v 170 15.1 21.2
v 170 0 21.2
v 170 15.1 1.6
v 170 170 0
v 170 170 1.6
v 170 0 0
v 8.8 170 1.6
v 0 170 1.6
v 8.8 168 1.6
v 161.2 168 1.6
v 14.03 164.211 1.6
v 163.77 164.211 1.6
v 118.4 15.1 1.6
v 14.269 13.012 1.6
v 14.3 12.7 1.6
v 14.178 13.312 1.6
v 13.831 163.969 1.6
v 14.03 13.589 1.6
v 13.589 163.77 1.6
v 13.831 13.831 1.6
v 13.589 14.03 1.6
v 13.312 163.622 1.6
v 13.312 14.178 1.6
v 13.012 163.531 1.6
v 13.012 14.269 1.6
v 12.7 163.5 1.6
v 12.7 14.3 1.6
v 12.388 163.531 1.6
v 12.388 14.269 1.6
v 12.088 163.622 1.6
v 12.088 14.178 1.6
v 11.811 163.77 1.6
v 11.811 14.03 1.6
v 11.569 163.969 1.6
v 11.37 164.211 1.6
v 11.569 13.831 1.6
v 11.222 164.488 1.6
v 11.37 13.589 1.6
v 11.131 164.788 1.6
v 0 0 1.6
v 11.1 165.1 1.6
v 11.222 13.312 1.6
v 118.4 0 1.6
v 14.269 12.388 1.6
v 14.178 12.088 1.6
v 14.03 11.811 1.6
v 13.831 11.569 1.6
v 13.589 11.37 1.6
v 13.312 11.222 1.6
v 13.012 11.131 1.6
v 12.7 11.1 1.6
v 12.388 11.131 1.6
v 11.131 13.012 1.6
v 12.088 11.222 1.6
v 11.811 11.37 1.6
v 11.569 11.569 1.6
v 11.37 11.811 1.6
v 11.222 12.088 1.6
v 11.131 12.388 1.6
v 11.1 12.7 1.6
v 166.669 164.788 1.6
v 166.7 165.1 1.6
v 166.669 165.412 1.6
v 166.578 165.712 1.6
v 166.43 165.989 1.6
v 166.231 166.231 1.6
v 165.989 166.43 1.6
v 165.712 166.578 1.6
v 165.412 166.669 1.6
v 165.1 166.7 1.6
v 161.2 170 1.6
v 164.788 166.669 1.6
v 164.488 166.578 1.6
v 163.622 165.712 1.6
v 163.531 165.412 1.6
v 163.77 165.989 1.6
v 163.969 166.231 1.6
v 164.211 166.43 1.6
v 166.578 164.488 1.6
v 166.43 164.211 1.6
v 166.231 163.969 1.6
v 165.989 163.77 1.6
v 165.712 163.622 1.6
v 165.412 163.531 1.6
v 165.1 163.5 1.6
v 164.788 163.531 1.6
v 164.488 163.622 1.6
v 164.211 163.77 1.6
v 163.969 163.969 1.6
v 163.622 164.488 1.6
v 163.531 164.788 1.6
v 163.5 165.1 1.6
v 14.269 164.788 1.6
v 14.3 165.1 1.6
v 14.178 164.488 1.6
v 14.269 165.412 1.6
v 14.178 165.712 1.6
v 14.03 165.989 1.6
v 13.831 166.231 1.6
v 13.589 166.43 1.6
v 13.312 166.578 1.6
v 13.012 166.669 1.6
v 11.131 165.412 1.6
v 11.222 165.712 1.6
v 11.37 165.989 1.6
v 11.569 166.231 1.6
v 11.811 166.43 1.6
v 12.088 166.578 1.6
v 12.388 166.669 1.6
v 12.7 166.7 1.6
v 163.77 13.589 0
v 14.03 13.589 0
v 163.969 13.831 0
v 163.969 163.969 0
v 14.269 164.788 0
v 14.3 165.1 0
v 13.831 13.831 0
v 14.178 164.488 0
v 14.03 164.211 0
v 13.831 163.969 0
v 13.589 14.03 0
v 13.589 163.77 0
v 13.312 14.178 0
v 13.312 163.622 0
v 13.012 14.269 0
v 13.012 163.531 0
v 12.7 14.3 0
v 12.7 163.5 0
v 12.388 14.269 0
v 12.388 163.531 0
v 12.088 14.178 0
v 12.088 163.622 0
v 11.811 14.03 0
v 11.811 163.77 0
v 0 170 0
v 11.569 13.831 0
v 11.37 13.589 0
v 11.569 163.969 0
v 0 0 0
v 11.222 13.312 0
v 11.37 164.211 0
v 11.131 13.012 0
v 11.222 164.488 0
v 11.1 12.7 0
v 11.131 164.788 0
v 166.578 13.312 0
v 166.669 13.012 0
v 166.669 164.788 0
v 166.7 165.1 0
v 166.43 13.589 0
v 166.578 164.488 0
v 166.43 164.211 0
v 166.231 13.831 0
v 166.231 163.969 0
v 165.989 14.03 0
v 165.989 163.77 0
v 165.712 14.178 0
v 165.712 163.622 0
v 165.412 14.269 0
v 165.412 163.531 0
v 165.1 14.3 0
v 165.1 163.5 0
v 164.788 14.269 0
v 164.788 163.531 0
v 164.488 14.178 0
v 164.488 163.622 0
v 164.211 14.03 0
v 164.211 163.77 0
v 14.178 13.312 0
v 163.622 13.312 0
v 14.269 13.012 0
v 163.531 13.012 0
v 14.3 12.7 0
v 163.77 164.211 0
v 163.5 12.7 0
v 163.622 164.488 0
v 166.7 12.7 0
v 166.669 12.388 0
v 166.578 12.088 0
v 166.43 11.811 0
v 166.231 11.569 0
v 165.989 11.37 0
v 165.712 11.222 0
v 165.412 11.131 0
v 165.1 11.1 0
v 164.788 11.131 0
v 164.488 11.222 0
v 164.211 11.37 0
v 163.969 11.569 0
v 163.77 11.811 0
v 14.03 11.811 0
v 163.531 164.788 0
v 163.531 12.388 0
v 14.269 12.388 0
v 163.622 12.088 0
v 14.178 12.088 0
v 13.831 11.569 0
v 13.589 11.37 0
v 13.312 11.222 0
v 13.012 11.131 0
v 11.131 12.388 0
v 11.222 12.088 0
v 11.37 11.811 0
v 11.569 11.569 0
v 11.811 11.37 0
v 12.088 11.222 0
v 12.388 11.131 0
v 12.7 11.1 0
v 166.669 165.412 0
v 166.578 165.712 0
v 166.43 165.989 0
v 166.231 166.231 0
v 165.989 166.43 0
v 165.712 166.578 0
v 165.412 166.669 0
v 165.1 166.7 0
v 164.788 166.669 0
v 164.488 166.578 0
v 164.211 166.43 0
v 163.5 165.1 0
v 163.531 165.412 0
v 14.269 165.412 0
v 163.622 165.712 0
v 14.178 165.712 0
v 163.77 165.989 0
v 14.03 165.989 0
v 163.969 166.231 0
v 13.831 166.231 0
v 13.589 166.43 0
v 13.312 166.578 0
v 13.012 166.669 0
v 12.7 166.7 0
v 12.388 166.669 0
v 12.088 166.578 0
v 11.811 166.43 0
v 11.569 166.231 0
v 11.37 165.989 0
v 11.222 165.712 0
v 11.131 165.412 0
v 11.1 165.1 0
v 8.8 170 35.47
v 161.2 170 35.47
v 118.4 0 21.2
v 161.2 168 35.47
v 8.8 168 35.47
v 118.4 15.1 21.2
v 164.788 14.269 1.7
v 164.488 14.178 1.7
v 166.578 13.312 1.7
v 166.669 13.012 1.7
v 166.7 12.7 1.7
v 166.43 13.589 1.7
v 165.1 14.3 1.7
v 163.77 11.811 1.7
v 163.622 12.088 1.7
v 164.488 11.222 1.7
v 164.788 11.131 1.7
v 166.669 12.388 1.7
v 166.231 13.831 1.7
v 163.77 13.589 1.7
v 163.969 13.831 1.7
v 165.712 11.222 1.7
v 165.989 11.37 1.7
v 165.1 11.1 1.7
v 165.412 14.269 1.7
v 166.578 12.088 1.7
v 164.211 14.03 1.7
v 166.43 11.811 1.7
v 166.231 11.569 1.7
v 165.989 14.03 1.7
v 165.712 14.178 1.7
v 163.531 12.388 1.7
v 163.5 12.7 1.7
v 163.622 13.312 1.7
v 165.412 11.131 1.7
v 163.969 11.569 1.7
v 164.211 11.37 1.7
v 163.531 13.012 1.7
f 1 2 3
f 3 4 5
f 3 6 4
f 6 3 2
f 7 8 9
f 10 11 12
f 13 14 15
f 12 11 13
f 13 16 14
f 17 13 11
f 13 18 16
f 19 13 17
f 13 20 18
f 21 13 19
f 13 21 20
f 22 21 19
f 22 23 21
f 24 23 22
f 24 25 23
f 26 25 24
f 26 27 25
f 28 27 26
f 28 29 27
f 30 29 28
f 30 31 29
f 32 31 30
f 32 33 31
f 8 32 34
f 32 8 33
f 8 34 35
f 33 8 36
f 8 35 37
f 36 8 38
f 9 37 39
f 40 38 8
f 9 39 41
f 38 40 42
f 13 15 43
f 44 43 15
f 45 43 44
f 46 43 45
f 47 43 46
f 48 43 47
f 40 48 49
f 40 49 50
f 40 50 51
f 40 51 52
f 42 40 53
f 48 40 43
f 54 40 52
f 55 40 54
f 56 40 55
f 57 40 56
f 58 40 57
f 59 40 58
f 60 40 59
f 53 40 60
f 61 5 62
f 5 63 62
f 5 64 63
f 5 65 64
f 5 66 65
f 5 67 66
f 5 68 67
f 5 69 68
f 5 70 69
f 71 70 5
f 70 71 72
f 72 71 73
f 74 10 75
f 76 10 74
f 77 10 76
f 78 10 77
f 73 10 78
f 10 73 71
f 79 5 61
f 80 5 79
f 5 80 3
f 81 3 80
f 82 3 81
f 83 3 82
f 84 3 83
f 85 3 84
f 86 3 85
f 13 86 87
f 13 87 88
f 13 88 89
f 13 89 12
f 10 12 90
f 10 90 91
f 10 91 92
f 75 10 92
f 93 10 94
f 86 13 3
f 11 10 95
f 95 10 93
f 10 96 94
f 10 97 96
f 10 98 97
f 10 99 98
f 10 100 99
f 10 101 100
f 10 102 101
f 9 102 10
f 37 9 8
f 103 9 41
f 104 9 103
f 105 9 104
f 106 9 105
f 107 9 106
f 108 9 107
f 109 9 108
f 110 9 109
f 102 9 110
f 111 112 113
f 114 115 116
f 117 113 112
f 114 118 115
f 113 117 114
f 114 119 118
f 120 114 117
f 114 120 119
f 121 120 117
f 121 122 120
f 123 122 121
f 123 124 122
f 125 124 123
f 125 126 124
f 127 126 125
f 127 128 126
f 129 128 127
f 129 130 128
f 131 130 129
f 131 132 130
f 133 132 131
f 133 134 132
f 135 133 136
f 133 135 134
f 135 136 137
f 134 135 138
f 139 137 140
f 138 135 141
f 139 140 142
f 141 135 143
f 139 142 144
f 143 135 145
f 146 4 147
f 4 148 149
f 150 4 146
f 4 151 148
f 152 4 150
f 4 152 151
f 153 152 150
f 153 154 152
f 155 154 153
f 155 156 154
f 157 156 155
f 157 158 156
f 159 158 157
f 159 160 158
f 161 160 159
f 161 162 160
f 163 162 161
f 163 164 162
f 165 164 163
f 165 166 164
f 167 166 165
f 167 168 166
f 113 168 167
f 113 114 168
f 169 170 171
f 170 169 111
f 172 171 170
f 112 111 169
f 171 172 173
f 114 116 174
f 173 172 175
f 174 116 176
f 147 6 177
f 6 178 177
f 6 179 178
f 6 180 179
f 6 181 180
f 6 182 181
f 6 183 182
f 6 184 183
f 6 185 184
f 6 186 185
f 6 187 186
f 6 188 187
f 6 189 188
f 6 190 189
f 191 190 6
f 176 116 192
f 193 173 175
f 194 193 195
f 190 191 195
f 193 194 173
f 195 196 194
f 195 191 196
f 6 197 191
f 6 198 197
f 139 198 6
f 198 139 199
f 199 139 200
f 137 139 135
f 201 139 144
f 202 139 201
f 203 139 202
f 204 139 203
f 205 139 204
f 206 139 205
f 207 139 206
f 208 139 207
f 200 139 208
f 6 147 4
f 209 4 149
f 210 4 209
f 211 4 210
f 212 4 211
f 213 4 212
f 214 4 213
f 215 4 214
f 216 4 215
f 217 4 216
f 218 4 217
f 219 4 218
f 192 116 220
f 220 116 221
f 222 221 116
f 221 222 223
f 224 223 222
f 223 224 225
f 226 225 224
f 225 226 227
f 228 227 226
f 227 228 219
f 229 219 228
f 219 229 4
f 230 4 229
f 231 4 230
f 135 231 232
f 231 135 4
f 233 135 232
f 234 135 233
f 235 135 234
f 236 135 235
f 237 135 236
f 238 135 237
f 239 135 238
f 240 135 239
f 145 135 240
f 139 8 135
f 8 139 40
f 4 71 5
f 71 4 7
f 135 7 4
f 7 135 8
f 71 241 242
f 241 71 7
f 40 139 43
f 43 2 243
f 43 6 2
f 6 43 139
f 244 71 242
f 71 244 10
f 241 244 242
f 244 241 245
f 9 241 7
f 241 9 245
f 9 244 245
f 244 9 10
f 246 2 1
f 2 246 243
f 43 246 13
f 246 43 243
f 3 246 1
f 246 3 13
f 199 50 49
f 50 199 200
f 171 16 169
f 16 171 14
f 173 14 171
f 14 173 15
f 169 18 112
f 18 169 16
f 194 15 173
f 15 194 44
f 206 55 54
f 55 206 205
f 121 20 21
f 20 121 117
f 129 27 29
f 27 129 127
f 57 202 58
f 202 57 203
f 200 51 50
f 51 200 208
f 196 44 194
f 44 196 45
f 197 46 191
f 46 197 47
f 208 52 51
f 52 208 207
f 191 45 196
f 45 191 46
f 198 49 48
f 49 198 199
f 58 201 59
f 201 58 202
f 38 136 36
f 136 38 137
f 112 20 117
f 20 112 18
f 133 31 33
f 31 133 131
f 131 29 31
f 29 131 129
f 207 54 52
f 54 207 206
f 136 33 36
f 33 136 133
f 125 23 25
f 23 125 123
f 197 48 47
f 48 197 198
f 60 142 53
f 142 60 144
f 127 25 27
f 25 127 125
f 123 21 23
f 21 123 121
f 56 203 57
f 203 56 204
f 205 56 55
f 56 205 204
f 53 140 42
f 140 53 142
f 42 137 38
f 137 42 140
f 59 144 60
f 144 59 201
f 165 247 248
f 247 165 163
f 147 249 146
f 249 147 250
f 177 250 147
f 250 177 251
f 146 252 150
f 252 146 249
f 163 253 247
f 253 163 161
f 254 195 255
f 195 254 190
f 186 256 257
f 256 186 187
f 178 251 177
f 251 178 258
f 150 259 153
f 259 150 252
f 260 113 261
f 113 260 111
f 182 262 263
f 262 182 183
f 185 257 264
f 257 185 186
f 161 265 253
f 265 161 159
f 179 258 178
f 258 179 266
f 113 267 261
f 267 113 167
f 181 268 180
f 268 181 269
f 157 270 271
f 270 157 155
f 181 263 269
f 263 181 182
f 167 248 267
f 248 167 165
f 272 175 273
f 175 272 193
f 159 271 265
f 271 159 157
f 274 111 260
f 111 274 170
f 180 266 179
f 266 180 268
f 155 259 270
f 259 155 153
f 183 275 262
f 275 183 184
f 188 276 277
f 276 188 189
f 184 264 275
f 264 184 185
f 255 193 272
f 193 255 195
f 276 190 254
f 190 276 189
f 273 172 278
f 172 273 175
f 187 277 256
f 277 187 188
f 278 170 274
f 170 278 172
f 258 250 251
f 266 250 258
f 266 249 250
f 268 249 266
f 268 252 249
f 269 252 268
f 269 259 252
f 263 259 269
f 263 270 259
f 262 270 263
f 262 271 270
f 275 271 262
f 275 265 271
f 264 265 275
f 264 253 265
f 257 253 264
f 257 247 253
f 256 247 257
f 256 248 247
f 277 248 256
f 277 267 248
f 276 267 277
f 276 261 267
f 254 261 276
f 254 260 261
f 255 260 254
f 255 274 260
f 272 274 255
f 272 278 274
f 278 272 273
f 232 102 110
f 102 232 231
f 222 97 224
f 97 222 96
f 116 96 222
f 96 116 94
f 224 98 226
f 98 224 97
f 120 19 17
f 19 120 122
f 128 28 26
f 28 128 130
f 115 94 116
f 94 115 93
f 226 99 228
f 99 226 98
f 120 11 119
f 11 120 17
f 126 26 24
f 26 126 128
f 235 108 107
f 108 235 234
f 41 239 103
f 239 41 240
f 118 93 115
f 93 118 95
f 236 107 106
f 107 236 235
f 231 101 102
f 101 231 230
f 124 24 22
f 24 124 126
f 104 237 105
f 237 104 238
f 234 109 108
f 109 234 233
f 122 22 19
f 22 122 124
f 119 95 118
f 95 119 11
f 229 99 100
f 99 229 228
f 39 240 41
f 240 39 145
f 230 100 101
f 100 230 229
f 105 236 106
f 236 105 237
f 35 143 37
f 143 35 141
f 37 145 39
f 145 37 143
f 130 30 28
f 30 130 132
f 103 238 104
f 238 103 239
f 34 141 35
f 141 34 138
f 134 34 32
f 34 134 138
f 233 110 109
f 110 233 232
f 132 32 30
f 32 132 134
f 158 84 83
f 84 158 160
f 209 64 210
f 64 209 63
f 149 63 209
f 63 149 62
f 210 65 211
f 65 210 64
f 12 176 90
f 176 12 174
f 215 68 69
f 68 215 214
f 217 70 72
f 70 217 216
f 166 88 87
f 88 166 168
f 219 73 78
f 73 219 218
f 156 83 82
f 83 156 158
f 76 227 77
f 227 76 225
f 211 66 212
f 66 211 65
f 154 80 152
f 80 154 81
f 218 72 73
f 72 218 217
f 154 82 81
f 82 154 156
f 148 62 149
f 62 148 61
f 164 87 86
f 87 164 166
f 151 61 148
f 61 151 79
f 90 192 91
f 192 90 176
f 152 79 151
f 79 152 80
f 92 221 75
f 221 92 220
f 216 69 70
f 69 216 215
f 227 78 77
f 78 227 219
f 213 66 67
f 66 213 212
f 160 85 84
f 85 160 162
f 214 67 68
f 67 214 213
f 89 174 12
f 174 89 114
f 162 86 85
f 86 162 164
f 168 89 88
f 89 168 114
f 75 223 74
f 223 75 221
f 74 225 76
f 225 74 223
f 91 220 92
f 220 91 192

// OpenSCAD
// file: ../case/dimensions.scad
// Shared dimensions for all case components
// This file defines common parameters used across multiple case parts

// --- Wall and Material ---
wall_thickness = 3;

// --- Motherboard (Mini-ITX) ---
mobo_width = 170;
mobo_depth = 170;
mobo_pcb_thickness = 1.6;

// --- Standoffs ---
standoff_height = 6;  // Female thread portion of M3x10+6mm male-female standoff
standoff_hole_radius = 1.6;  // M3 clearance (deprecated - see integrated bottom panel design)
standoff_locations = [
    [12.7, 12.7],
    [165.1, 12.7],
    [12.7, 165.1],
    [165.1, 165.1]
];

// --- Standoff Hexagonal Receptacles (Integrated Bottom Panel Design) ---
standoff_boss_height = 2.5;              // Height of hex boss above panel interior surface
standoff_hex_size_flat_to_flat = 5.5;   // Hex size for M3 screw head (flat-to-flat)
standoff_hex_size_point_to_point = 6.35; // Hex size point-to-point (calculated from F-F)
standoff_pocket_depth = 2.2;             // Depth of hex recess for screw head
standoff_boss_diameter = 6.85;           // Overall boss diameter (hex point + FDM tolerance)
standoff_mounting_screw_length = 8;      // M3 x 8mm cap screw (recommended)
standoff_screw_clearance_hole = 3.3;     // M3 clearance hole + FDM tolerance

// --- I/O Shield ---
// Standard ATX I/O shield dimensions
io_shield_width = 158.75;   // 6.25 inches (standard ATX)
io_shield_height = 44.45;   // 1.75 inches (standard ATX)
io_shield_x_offset = (mobo_width - io_shield_width) / 2;
io_shield_z_offset = 5;     // 5mm from bottom of plate

// --- Backplate ---
backplate_height = 88.9;    // 3.5 inches
backplate_thickness = wall_thickness;

// --- CPU Cooler (Noctua NH-L12S) ---
cooler_width = 128;
cooler_depth = 146;
cooler_base_height = 35;      // Base plate and heatpipes
cooler_fan_height = 15;       // 120mm x 15mm fan (NF-A12x15)
cooler_fins_height = 20;      // Heatsink fins on top
cooler_total_height = cooler_base_height + cooler_fan_height + cooler_fins_height;  // 70mm

// --- Power Supplies ---
// Flex ATX (from technical drawing)
// Standing orientation: 40mm wide (X), 150mm deep (Y), 80mm tall (Z)
flex_atx_width = 40.0;      // A: Width (X - thin side, standing)
flex_atx_length = 150.0;    // B: Length (Y - depth)
flex_atx_height = 80.0;     // G: Height (Z - tall side, standing)

// Flex ATX Mounting holes - 8-32 UNC thread (4 places on rear 40x80mm face)
flex_atx_mount_hole_radius = 2.1;   // 8-32 clearance (~4.2mm dia)
flex_atx_mount_x_inset = 5;         // Distance from left/right edges (corrected from 12.5)
flex_atx_mount_z_inset = 5;         // Distance from top/bottom edges (corrected from 8.25)

// Calculated mounting hole positions (X, Z pairs relative to PSU origin)
// Note: Only 3 holes - top-right (coords) removed where C14 inlet is located
// When viewing from back: top-right (coords) = top-left (view)
flex_atx_mount_holes = [
    [flex_atx_mount_x_inset, flex_atx_mount_z_inset],                                    // Bottom-left (coords) = Bottom-right (view)
    [flex_atx_width - flex_atx_mount_x_inset, flex_atx_mount_z_inset],                   // Bottom-right (coords) = Bottom-left (view)
    [flex_atx_mount_x_inset, flex_atx_height - flex_atx_mount_z_inset]                   // Top-left (coords) = Top-right (view)
    // Top-right (coords) removed - C14 power inlet is here = Top-left (view)
];

// SFX
sfx_length = 125;
sfx_width = 100;
sfx_height = 63.5;

// --- HDD 3.5" Dimensions ---
hdd_width = 101.6;
hdd_length = 147;
hdd_height = 26.1;

// --- NAS 2-Disk Config ---
// 2 HDDs side-by-side (controlling dimension for case width)
// See SPEC.md Section 3.3 for design rationale
nas_2disk_rail_width = 2;
nas_2disk_gap = 5;           // Gap between bays
nas_2disk_padding = 2;       // Clearance around HDDs
nas_2disk_bay_width = hdd_width + 2 * nas_2disk_rail_width;  // ~105.6mm per bay
nas_2disk_inner_width = 2 * nas_2disk_bay_width + nas_2disk_gap;  // ~216.2mm
nas_2disk_width = nas_2disk_inner_width + 2 * (wall_thickness + nas_2disk_padding);  // ~226mm

// --- PSU Compartment ---
// Flex ATX PSU in standing orientation (40mm width)
flex_atx_standing_width = flex_atx_width;  // 40mm (already in standing orientation)
psu_compartment_width = nas_2disk_width - mobo_width;  // ~56mm (40mm PSU + 16mm clearance)

// --- Interior Chamber Height (standoffs + motherboard + cooler) ---
interior_chamber_height = standoff_height + mobo_pcb_thickness + cooler_total_height;  // ~94mm

// --- Minimal Config External Dimensions ---
// Motherboard area only (without PSU)
minimal_mobo_exterior_width = mobo_width + 2 * wall_thickness;   // 176mm
minimal_mobo_exterior_depth = mobo_depth + 2 * wall_thickness;   // 176mm
minimal_exterior_height = interior_chamber_height + 2 * wall_thickness;   // ~100mm

// With Flex ATX PSU next to motherboard
// Width controlled by NAS 2-disk HDD layout (see SPEC.md Section 3.3)
minimal_with_psu_width = nas_2disk_width;  // ~226mm (PSU compartment = 56mm, PSU on side = 40mm)

// --- Interior Panel Dimensions (top/bottom panels fit between walls) ---
interior_panel_width = minimal_with_psu_width - 2 * wall_thickness;  // ~220mm
interior_panel_depth = mobo_depth;                                    // 170mm

// --- Side Panel Dimensions (left/right panels form exterior walls) ---
side_panel_height = minimal_exterior_height;                          // ~100mm
side_panel_depth = mobo_depth + 2 * wall_thickness;                   // 176mm

// --- Front/Back Panel Dimensions (fit between side walls, full exterior height) ---
front_back_panel_width = interior_panel_width;                        // ~220mm
front_back_panel_height = side_panel_height;                          // ~100mm (full exterior)

// --- Ventilation ---
honeycomb_radius = 3;
vent_padding = 5;

// --- Screw Holes for Panel Assembly ---
panel_screw_radius = 1.6;  // M3
panel_screw_inset = 8;     // Distance from edge

// --- GPU ---
gpu_length = 320;          // Max GPU length
gpu_height = 140;          // GPU PCB + cooler height
gpu_width = 60;            // 3 slots

// --- GPU Config External Dimensions ---
// From SPEC.md Section 8.4
gpu_config_width = 171;    // mm
gpu_config_depth = 378;    // mm
gpu_config_height = 190;   // mm

// --- Fans ---
fan_120_size = 120;
fan_120_thickness = 25;
fan_140_size = 140;
fan_140_thickness = 25;

// --- AIO Radiator ---
radiator_240_length = 275;
radiator_240_width = 120;
radiator_240_thickness = 27;

// --- NAS Many-Disk Config ---
// 5-8 drives mounted vertically (on narrowest side)
nas_many_drive_count = 6;  // Default 6 drives
nas_many_drive_spacing = 5;
nas_many_enclosure_height = hdd_width + wall_thickness + 5;  // ~110mm (drives on side)

// --- Power Inlet C14 ---
c14_width = 50;
c14_height = 27;
c14_depth = 30;

// --- Open Air Frame ---
// Frame cylinder height (from motherboard surface to inside panel face)
// Derived: interior_chamber_height - standoff_height - mobo_pcb_thickness
frame_cylinder_height = interior_chamber_height - standoff_height - mobo_pcb_thickness;  // ~86mm
frame_cylinder_outer_diameter = 8;     // Outer diameter
frame_cylinder_inner_diameter = 3.2;   // M3 clearance for standoff stud
frame_cylinder_thread_depth = 10;      // Matches extended_standoff_male_height
// main file
// A module to create a rudimentary Mini-ITX motherboard model
// Includes mounting holes at standard Mini-ITX positions
// Note: Standoffs are now part of base_assembly, not the motherboard module

include <../case/dimensions.scad>

module motherboard() {
    mobo_width = 170;
    mobo_depth = 170;
    mobo_thickness = 1.6;

    io_shield_width = 152.4;
    io_shield_height = 33.87;
    io_shield_thickness = 2;
    io_shield_x_offset = (mobo_width - io_shield_width) / 2;

    // ATX 24-pin connector dimensions
    atx_conn_l = 51.6;
    atx_conn_w = 15.1;
    atx_conn_h = 19.6;

    union() {
        // Motherboard PCB with mounting holes
        color("purple") {
            difference() {
                union() {
                    // Motherboard PCB
                    cube([mobo_width, mobo_depth, mobo_thickness]);
                    // I/O Shield
                    translate([io_shield_x_offset, mobo_depth - io_shield_thickness, mobo_thickness]) {
                        cube([io_shield_width, io_shield_thickness, io_shield_height]);
                    }
                    // 24-pin ATX Connector
                    translate([mobo_width - atx_conn_l, 0, mobo_thickness]) {
                        cube([atx_conn_l, atx_conn_w, atx_conn_h]);
                    }
                }
                // Mounting holes at Mini-ITX standoff locations
                for (pos = standoff_locations) {
                    translate([pos[0], pos[1], -0.1]) {
                        cylinder(h = mobo_thickness + 0.2, r = standoff_hole_radius, $fn = 32);
                    }
                }
            }
        }

        // Note: Standoffs removed from motherboard module (legacy code)
        // Standoffs are now part of base_assembly (integrated bottom panel design)
        // See modules/case/base/base_assembly.scad
    }
}

// Preview
motherboard();
